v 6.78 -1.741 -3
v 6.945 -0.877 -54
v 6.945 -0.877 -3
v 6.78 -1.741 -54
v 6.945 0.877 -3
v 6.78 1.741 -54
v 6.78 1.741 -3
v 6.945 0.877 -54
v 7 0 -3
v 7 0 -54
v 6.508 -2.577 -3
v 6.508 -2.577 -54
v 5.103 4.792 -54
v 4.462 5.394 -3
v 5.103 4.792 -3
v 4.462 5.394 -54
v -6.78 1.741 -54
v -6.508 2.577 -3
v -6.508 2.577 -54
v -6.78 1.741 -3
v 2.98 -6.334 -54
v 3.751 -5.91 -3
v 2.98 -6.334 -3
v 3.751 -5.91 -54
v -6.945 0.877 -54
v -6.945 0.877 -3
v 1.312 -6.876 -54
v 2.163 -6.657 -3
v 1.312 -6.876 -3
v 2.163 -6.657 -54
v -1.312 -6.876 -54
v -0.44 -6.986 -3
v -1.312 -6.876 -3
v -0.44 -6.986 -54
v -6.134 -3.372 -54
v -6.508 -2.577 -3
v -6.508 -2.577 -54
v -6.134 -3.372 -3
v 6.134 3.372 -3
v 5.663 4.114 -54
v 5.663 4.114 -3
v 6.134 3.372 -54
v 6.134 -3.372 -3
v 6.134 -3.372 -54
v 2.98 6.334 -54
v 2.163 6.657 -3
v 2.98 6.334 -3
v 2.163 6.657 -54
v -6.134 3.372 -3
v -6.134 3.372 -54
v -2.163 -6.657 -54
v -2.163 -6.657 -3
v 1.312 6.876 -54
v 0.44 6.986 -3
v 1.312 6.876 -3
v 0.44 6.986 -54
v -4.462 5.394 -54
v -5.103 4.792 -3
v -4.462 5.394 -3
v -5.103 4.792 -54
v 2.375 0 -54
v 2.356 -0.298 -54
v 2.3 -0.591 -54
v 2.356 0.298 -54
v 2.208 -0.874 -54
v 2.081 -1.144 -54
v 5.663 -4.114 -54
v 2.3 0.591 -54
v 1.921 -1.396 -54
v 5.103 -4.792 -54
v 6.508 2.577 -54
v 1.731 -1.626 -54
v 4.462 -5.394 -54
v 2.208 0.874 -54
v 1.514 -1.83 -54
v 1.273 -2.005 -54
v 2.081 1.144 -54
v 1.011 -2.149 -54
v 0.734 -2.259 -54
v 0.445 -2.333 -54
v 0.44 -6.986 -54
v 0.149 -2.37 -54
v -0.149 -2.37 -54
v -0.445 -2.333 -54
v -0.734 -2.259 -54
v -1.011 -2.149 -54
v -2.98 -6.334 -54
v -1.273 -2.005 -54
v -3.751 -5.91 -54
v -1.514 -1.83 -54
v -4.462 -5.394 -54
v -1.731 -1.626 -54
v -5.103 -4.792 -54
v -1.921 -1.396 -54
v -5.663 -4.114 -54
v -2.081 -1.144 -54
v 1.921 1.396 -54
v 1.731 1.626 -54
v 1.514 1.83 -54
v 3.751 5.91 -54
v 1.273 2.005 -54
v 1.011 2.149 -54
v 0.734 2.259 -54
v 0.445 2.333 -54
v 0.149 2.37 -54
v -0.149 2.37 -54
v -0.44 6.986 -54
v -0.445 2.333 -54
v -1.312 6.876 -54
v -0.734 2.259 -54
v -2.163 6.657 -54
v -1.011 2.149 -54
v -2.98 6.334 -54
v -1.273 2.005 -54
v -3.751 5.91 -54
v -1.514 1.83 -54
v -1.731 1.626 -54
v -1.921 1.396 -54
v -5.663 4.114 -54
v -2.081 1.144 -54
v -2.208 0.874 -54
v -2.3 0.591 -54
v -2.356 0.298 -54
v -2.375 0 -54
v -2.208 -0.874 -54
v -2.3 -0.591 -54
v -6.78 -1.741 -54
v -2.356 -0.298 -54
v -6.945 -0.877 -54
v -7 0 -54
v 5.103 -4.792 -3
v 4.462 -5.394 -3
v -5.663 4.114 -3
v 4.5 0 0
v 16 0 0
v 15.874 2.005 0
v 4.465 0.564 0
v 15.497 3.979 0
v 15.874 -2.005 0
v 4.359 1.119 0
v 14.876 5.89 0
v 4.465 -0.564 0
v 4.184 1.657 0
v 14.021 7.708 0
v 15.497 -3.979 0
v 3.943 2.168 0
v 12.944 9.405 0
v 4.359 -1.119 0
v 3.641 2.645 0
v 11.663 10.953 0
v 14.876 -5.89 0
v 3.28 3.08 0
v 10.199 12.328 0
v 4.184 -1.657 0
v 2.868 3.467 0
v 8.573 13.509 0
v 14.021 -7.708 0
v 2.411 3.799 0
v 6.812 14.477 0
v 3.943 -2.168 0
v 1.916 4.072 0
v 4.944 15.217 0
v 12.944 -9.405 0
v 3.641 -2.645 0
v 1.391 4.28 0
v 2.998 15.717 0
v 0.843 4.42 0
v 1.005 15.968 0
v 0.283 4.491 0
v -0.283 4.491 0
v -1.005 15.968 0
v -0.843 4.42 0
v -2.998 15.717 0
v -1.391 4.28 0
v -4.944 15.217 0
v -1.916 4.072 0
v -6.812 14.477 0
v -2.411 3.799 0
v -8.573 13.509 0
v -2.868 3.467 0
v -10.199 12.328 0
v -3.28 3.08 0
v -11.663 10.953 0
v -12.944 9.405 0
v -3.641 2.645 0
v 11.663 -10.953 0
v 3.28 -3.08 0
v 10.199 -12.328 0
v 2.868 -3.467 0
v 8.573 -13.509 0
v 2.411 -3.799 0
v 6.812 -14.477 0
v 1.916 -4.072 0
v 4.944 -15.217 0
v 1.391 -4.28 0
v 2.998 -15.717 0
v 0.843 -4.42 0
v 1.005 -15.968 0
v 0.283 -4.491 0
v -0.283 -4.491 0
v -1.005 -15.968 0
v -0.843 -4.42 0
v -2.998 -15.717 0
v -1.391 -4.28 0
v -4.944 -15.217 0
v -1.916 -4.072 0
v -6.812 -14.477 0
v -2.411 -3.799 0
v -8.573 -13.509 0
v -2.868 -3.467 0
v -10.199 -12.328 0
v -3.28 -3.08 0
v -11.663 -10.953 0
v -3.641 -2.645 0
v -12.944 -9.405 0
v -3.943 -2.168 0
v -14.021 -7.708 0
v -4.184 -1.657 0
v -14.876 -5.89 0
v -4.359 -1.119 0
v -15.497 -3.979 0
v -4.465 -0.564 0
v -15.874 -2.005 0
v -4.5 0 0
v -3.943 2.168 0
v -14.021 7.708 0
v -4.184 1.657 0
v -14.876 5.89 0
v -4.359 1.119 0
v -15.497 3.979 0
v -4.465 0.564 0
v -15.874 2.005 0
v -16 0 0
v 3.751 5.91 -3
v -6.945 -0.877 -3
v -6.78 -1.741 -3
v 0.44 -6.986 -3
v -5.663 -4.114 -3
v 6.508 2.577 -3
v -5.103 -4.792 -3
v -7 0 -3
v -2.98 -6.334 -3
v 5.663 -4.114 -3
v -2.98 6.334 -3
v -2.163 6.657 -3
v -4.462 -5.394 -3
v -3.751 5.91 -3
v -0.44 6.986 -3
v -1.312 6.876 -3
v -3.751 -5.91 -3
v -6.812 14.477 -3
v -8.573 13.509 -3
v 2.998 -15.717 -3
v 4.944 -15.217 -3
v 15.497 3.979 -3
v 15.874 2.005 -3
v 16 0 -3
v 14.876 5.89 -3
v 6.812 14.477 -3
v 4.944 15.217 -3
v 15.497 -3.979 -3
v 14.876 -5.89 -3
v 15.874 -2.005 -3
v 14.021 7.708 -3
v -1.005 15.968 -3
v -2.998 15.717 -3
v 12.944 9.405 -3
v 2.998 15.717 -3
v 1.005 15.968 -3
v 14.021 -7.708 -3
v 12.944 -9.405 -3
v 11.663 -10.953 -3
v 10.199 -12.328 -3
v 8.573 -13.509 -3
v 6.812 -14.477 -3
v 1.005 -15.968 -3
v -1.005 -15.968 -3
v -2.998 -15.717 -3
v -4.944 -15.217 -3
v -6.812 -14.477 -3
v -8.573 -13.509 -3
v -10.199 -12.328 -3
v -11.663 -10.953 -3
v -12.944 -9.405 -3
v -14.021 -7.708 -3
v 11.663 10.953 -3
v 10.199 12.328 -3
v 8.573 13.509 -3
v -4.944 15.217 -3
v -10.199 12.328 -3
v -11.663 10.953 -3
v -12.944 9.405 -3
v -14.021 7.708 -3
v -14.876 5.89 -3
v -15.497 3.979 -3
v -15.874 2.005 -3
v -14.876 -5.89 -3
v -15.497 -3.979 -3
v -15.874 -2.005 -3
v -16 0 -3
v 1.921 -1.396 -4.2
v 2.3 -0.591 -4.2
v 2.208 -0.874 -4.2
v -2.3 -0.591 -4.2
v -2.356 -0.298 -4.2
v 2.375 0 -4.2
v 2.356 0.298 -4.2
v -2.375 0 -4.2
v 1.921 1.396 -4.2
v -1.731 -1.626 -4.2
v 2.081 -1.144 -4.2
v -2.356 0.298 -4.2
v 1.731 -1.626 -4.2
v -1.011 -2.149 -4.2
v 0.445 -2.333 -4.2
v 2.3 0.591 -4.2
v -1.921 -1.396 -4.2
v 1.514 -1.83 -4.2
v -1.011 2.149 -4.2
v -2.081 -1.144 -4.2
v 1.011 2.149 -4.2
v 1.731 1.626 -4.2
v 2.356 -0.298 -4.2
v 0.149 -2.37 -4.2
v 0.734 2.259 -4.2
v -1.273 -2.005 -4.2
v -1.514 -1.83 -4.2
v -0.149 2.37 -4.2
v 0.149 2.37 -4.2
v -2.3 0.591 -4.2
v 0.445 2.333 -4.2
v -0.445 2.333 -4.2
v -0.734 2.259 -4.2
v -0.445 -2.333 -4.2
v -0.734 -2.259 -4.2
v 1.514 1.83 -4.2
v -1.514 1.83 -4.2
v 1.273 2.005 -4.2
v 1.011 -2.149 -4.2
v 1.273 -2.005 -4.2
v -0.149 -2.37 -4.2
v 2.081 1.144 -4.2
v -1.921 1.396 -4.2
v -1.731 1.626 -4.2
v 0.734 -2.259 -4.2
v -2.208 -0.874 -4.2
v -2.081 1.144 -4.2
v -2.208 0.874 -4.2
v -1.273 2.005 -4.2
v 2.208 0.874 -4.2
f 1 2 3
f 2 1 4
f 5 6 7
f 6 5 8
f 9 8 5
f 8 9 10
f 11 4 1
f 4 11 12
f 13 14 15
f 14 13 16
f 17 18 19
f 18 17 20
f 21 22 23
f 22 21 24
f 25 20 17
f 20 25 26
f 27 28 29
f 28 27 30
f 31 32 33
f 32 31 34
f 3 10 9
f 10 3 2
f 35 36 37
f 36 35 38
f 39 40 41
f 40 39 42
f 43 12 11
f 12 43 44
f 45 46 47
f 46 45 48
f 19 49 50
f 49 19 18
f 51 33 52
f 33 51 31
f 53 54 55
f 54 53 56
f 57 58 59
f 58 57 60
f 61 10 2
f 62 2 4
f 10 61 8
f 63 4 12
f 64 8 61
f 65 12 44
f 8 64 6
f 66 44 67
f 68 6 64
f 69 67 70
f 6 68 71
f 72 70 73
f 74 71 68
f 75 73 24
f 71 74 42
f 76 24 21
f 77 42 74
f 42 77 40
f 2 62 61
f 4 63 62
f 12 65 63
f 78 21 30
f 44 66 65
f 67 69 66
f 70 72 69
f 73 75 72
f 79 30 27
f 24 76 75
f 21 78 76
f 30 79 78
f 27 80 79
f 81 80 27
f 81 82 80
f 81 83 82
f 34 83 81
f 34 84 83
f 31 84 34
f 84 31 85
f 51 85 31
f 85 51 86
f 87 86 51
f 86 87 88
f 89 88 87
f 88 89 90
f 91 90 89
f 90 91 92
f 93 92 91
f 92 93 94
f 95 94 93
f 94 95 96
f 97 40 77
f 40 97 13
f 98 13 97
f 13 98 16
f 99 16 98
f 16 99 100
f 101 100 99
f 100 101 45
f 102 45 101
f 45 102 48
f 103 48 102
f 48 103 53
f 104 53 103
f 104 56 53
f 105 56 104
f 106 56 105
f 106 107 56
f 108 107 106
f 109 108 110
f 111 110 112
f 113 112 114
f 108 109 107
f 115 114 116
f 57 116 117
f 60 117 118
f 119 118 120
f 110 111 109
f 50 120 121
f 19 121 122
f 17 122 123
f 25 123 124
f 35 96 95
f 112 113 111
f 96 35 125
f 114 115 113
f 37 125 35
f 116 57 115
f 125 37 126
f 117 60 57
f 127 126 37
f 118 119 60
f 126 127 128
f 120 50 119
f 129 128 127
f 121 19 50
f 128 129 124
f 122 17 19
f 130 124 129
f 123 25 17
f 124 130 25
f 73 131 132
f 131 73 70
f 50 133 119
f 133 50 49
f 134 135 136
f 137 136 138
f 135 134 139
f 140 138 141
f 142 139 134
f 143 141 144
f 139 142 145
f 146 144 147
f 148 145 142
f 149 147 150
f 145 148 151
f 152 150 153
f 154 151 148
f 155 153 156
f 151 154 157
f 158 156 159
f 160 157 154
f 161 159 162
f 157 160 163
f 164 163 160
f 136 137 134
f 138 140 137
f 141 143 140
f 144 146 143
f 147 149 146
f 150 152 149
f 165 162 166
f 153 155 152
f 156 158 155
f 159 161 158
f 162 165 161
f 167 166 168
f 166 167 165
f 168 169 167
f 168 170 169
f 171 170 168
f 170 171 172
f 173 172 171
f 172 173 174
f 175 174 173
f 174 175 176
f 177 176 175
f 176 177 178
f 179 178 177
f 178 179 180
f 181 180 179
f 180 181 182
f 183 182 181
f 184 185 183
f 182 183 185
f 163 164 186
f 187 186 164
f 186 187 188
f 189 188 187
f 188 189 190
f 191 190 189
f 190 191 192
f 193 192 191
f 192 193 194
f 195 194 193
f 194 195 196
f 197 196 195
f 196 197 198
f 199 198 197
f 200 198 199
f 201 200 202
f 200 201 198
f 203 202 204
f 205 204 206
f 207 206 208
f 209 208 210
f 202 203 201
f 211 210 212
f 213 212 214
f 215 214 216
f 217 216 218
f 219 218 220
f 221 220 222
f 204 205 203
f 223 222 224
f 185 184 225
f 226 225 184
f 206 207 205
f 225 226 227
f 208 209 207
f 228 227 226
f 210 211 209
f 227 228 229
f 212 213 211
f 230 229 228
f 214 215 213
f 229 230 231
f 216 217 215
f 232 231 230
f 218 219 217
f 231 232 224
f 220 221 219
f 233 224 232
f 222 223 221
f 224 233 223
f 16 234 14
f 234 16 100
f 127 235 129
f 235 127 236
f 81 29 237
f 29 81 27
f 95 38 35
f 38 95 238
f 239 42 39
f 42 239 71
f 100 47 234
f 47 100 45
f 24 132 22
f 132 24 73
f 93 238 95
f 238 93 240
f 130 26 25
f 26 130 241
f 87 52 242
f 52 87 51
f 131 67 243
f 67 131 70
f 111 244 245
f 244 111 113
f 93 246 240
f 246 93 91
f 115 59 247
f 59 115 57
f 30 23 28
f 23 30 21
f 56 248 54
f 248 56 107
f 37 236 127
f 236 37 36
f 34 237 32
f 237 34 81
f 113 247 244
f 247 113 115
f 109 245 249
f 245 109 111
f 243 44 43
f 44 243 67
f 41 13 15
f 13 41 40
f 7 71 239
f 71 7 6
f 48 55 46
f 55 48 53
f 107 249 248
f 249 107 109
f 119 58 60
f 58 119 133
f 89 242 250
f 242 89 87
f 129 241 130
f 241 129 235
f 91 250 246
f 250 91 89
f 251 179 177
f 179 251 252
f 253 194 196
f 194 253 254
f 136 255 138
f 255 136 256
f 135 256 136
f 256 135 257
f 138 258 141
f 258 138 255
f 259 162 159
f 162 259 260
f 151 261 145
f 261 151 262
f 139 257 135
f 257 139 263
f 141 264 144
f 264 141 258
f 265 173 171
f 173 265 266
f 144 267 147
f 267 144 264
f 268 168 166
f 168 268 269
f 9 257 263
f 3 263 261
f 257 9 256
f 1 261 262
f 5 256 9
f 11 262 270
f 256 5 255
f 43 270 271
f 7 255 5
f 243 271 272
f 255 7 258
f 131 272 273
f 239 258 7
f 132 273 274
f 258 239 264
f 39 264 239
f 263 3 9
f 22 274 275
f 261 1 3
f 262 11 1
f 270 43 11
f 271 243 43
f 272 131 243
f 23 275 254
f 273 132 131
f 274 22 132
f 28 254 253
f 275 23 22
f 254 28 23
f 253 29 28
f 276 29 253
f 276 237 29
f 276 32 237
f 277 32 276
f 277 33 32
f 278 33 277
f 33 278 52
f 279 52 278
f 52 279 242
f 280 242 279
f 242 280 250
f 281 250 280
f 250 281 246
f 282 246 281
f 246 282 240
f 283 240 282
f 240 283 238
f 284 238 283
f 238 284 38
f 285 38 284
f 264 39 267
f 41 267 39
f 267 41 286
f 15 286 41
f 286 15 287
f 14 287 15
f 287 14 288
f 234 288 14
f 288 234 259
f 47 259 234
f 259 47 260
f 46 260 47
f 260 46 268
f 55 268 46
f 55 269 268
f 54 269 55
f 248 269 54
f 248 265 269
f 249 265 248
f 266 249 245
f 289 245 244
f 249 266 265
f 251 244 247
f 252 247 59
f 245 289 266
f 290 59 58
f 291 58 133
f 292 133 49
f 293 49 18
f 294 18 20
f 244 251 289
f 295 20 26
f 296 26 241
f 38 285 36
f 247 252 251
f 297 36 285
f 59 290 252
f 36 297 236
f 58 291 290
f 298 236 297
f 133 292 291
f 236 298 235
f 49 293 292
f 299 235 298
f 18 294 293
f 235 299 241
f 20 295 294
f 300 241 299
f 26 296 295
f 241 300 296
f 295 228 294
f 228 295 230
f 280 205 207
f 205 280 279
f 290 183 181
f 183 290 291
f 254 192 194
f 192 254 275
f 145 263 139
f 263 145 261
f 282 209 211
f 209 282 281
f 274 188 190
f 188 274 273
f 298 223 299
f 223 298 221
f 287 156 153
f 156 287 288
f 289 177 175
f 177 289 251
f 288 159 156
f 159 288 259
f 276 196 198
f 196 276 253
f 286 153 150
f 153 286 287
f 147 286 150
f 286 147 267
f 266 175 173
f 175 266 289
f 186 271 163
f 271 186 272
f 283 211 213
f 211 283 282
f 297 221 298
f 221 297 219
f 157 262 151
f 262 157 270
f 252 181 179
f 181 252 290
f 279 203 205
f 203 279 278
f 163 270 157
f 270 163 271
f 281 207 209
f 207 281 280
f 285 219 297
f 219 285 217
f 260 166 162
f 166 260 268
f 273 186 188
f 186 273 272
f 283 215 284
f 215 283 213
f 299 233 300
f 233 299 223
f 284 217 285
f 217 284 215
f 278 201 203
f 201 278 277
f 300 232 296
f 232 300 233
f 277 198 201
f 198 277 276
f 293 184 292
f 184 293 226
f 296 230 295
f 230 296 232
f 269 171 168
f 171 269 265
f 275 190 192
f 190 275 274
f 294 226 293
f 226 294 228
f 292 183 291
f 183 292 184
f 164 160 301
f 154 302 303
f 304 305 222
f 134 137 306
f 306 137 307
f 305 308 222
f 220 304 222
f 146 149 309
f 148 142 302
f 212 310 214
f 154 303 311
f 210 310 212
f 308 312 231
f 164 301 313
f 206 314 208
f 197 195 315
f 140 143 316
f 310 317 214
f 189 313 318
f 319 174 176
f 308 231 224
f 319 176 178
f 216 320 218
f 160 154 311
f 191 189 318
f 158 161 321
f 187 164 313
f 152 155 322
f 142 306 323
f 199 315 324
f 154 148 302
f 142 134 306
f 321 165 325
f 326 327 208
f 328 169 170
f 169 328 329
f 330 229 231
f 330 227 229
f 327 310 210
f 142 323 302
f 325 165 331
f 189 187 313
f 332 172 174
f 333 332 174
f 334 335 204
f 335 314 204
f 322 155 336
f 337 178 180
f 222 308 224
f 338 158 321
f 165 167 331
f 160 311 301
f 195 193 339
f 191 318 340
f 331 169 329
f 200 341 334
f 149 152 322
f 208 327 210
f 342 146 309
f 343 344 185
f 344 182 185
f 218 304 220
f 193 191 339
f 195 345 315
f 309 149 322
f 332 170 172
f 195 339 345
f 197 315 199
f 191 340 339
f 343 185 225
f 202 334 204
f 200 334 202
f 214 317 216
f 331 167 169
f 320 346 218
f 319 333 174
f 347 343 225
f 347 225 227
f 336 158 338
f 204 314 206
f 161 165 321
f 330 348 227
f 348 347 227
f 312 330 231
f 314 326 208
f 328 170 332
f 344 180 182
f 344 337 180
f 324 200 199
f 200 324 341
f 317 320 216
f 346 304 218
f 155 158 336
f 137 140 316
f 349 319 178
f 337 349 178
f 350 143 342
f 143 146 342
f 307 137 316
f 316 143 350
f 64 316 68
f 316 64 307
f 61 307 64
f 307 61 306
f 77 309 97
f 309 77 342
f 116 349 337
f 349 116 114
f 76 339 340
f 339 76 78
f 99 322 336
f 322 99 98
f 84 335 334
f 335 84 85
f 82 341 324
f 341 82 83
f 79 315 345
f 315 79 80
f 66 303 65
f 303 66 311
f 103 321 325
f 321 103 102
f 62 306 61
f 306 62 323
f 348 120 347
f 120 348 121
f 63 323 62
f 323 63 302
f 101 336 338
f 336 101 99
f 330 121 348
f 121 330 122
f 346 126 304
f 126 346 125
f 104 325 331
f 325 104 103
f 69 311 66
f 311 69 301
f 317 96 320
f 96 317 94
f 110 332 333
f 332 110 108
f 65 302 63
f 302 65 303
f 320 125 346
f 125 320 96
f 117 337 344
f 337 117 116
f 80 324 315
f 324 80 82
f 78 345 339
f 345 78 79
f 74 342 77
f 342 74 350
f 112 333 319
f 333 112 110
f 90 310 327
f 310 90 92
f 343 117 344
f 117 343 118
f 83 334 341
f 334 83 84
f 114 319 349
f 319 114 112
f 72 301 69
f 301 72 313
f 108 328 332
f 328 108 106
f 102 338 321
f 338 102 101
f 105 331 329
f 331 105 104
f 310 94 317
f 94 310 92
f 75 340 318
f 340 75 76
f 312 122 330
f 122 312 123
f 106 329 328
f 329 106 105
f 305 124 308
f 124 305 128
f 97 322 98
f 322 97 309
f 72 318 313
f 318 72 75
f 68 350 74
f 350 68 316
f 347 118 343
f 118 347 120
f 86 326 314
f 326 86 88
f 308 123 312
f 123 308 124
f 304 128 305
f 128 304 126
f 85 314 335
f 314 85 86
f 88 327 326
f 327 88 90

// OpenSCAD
$fn = 50;


difference() {
	union() {
		translate(v = [0, 0, -54.0000000000]) {
			cylinder(h = 54, r = 7.0000000000);
		}
		translate(v = [0, 0, -3.0000000000]) {
			cylinder(h = 3, r = 16.0000000000);
		}
	}
	union() {
		translate(v = [0, 0, 0]) {
			rotate(a = [0, 0, 0]) {
				difference() {
					union() {
						#translate(v = [0, 0, -54.0000000000]) {
							cylinder(h = 54, r = 2.2500000000);
						}
						#translate(v = [0, 0, -4.2000000000]) {
							cylinder(h = 4.2000000000, r1 = 2.3750000000, r2 = 4.5000000000);
						}
						#translate(v = [0, 0, -54.0000000000]) {
							cylinder(h = 54, r = 2.3750000000);
						}
						#translate(v = [0, 0, -54.0000000000]) {
							cylinder(h = 54, r = 2.2500000000);
						}
					}
					union();
				}
			}
		}
	}
}
